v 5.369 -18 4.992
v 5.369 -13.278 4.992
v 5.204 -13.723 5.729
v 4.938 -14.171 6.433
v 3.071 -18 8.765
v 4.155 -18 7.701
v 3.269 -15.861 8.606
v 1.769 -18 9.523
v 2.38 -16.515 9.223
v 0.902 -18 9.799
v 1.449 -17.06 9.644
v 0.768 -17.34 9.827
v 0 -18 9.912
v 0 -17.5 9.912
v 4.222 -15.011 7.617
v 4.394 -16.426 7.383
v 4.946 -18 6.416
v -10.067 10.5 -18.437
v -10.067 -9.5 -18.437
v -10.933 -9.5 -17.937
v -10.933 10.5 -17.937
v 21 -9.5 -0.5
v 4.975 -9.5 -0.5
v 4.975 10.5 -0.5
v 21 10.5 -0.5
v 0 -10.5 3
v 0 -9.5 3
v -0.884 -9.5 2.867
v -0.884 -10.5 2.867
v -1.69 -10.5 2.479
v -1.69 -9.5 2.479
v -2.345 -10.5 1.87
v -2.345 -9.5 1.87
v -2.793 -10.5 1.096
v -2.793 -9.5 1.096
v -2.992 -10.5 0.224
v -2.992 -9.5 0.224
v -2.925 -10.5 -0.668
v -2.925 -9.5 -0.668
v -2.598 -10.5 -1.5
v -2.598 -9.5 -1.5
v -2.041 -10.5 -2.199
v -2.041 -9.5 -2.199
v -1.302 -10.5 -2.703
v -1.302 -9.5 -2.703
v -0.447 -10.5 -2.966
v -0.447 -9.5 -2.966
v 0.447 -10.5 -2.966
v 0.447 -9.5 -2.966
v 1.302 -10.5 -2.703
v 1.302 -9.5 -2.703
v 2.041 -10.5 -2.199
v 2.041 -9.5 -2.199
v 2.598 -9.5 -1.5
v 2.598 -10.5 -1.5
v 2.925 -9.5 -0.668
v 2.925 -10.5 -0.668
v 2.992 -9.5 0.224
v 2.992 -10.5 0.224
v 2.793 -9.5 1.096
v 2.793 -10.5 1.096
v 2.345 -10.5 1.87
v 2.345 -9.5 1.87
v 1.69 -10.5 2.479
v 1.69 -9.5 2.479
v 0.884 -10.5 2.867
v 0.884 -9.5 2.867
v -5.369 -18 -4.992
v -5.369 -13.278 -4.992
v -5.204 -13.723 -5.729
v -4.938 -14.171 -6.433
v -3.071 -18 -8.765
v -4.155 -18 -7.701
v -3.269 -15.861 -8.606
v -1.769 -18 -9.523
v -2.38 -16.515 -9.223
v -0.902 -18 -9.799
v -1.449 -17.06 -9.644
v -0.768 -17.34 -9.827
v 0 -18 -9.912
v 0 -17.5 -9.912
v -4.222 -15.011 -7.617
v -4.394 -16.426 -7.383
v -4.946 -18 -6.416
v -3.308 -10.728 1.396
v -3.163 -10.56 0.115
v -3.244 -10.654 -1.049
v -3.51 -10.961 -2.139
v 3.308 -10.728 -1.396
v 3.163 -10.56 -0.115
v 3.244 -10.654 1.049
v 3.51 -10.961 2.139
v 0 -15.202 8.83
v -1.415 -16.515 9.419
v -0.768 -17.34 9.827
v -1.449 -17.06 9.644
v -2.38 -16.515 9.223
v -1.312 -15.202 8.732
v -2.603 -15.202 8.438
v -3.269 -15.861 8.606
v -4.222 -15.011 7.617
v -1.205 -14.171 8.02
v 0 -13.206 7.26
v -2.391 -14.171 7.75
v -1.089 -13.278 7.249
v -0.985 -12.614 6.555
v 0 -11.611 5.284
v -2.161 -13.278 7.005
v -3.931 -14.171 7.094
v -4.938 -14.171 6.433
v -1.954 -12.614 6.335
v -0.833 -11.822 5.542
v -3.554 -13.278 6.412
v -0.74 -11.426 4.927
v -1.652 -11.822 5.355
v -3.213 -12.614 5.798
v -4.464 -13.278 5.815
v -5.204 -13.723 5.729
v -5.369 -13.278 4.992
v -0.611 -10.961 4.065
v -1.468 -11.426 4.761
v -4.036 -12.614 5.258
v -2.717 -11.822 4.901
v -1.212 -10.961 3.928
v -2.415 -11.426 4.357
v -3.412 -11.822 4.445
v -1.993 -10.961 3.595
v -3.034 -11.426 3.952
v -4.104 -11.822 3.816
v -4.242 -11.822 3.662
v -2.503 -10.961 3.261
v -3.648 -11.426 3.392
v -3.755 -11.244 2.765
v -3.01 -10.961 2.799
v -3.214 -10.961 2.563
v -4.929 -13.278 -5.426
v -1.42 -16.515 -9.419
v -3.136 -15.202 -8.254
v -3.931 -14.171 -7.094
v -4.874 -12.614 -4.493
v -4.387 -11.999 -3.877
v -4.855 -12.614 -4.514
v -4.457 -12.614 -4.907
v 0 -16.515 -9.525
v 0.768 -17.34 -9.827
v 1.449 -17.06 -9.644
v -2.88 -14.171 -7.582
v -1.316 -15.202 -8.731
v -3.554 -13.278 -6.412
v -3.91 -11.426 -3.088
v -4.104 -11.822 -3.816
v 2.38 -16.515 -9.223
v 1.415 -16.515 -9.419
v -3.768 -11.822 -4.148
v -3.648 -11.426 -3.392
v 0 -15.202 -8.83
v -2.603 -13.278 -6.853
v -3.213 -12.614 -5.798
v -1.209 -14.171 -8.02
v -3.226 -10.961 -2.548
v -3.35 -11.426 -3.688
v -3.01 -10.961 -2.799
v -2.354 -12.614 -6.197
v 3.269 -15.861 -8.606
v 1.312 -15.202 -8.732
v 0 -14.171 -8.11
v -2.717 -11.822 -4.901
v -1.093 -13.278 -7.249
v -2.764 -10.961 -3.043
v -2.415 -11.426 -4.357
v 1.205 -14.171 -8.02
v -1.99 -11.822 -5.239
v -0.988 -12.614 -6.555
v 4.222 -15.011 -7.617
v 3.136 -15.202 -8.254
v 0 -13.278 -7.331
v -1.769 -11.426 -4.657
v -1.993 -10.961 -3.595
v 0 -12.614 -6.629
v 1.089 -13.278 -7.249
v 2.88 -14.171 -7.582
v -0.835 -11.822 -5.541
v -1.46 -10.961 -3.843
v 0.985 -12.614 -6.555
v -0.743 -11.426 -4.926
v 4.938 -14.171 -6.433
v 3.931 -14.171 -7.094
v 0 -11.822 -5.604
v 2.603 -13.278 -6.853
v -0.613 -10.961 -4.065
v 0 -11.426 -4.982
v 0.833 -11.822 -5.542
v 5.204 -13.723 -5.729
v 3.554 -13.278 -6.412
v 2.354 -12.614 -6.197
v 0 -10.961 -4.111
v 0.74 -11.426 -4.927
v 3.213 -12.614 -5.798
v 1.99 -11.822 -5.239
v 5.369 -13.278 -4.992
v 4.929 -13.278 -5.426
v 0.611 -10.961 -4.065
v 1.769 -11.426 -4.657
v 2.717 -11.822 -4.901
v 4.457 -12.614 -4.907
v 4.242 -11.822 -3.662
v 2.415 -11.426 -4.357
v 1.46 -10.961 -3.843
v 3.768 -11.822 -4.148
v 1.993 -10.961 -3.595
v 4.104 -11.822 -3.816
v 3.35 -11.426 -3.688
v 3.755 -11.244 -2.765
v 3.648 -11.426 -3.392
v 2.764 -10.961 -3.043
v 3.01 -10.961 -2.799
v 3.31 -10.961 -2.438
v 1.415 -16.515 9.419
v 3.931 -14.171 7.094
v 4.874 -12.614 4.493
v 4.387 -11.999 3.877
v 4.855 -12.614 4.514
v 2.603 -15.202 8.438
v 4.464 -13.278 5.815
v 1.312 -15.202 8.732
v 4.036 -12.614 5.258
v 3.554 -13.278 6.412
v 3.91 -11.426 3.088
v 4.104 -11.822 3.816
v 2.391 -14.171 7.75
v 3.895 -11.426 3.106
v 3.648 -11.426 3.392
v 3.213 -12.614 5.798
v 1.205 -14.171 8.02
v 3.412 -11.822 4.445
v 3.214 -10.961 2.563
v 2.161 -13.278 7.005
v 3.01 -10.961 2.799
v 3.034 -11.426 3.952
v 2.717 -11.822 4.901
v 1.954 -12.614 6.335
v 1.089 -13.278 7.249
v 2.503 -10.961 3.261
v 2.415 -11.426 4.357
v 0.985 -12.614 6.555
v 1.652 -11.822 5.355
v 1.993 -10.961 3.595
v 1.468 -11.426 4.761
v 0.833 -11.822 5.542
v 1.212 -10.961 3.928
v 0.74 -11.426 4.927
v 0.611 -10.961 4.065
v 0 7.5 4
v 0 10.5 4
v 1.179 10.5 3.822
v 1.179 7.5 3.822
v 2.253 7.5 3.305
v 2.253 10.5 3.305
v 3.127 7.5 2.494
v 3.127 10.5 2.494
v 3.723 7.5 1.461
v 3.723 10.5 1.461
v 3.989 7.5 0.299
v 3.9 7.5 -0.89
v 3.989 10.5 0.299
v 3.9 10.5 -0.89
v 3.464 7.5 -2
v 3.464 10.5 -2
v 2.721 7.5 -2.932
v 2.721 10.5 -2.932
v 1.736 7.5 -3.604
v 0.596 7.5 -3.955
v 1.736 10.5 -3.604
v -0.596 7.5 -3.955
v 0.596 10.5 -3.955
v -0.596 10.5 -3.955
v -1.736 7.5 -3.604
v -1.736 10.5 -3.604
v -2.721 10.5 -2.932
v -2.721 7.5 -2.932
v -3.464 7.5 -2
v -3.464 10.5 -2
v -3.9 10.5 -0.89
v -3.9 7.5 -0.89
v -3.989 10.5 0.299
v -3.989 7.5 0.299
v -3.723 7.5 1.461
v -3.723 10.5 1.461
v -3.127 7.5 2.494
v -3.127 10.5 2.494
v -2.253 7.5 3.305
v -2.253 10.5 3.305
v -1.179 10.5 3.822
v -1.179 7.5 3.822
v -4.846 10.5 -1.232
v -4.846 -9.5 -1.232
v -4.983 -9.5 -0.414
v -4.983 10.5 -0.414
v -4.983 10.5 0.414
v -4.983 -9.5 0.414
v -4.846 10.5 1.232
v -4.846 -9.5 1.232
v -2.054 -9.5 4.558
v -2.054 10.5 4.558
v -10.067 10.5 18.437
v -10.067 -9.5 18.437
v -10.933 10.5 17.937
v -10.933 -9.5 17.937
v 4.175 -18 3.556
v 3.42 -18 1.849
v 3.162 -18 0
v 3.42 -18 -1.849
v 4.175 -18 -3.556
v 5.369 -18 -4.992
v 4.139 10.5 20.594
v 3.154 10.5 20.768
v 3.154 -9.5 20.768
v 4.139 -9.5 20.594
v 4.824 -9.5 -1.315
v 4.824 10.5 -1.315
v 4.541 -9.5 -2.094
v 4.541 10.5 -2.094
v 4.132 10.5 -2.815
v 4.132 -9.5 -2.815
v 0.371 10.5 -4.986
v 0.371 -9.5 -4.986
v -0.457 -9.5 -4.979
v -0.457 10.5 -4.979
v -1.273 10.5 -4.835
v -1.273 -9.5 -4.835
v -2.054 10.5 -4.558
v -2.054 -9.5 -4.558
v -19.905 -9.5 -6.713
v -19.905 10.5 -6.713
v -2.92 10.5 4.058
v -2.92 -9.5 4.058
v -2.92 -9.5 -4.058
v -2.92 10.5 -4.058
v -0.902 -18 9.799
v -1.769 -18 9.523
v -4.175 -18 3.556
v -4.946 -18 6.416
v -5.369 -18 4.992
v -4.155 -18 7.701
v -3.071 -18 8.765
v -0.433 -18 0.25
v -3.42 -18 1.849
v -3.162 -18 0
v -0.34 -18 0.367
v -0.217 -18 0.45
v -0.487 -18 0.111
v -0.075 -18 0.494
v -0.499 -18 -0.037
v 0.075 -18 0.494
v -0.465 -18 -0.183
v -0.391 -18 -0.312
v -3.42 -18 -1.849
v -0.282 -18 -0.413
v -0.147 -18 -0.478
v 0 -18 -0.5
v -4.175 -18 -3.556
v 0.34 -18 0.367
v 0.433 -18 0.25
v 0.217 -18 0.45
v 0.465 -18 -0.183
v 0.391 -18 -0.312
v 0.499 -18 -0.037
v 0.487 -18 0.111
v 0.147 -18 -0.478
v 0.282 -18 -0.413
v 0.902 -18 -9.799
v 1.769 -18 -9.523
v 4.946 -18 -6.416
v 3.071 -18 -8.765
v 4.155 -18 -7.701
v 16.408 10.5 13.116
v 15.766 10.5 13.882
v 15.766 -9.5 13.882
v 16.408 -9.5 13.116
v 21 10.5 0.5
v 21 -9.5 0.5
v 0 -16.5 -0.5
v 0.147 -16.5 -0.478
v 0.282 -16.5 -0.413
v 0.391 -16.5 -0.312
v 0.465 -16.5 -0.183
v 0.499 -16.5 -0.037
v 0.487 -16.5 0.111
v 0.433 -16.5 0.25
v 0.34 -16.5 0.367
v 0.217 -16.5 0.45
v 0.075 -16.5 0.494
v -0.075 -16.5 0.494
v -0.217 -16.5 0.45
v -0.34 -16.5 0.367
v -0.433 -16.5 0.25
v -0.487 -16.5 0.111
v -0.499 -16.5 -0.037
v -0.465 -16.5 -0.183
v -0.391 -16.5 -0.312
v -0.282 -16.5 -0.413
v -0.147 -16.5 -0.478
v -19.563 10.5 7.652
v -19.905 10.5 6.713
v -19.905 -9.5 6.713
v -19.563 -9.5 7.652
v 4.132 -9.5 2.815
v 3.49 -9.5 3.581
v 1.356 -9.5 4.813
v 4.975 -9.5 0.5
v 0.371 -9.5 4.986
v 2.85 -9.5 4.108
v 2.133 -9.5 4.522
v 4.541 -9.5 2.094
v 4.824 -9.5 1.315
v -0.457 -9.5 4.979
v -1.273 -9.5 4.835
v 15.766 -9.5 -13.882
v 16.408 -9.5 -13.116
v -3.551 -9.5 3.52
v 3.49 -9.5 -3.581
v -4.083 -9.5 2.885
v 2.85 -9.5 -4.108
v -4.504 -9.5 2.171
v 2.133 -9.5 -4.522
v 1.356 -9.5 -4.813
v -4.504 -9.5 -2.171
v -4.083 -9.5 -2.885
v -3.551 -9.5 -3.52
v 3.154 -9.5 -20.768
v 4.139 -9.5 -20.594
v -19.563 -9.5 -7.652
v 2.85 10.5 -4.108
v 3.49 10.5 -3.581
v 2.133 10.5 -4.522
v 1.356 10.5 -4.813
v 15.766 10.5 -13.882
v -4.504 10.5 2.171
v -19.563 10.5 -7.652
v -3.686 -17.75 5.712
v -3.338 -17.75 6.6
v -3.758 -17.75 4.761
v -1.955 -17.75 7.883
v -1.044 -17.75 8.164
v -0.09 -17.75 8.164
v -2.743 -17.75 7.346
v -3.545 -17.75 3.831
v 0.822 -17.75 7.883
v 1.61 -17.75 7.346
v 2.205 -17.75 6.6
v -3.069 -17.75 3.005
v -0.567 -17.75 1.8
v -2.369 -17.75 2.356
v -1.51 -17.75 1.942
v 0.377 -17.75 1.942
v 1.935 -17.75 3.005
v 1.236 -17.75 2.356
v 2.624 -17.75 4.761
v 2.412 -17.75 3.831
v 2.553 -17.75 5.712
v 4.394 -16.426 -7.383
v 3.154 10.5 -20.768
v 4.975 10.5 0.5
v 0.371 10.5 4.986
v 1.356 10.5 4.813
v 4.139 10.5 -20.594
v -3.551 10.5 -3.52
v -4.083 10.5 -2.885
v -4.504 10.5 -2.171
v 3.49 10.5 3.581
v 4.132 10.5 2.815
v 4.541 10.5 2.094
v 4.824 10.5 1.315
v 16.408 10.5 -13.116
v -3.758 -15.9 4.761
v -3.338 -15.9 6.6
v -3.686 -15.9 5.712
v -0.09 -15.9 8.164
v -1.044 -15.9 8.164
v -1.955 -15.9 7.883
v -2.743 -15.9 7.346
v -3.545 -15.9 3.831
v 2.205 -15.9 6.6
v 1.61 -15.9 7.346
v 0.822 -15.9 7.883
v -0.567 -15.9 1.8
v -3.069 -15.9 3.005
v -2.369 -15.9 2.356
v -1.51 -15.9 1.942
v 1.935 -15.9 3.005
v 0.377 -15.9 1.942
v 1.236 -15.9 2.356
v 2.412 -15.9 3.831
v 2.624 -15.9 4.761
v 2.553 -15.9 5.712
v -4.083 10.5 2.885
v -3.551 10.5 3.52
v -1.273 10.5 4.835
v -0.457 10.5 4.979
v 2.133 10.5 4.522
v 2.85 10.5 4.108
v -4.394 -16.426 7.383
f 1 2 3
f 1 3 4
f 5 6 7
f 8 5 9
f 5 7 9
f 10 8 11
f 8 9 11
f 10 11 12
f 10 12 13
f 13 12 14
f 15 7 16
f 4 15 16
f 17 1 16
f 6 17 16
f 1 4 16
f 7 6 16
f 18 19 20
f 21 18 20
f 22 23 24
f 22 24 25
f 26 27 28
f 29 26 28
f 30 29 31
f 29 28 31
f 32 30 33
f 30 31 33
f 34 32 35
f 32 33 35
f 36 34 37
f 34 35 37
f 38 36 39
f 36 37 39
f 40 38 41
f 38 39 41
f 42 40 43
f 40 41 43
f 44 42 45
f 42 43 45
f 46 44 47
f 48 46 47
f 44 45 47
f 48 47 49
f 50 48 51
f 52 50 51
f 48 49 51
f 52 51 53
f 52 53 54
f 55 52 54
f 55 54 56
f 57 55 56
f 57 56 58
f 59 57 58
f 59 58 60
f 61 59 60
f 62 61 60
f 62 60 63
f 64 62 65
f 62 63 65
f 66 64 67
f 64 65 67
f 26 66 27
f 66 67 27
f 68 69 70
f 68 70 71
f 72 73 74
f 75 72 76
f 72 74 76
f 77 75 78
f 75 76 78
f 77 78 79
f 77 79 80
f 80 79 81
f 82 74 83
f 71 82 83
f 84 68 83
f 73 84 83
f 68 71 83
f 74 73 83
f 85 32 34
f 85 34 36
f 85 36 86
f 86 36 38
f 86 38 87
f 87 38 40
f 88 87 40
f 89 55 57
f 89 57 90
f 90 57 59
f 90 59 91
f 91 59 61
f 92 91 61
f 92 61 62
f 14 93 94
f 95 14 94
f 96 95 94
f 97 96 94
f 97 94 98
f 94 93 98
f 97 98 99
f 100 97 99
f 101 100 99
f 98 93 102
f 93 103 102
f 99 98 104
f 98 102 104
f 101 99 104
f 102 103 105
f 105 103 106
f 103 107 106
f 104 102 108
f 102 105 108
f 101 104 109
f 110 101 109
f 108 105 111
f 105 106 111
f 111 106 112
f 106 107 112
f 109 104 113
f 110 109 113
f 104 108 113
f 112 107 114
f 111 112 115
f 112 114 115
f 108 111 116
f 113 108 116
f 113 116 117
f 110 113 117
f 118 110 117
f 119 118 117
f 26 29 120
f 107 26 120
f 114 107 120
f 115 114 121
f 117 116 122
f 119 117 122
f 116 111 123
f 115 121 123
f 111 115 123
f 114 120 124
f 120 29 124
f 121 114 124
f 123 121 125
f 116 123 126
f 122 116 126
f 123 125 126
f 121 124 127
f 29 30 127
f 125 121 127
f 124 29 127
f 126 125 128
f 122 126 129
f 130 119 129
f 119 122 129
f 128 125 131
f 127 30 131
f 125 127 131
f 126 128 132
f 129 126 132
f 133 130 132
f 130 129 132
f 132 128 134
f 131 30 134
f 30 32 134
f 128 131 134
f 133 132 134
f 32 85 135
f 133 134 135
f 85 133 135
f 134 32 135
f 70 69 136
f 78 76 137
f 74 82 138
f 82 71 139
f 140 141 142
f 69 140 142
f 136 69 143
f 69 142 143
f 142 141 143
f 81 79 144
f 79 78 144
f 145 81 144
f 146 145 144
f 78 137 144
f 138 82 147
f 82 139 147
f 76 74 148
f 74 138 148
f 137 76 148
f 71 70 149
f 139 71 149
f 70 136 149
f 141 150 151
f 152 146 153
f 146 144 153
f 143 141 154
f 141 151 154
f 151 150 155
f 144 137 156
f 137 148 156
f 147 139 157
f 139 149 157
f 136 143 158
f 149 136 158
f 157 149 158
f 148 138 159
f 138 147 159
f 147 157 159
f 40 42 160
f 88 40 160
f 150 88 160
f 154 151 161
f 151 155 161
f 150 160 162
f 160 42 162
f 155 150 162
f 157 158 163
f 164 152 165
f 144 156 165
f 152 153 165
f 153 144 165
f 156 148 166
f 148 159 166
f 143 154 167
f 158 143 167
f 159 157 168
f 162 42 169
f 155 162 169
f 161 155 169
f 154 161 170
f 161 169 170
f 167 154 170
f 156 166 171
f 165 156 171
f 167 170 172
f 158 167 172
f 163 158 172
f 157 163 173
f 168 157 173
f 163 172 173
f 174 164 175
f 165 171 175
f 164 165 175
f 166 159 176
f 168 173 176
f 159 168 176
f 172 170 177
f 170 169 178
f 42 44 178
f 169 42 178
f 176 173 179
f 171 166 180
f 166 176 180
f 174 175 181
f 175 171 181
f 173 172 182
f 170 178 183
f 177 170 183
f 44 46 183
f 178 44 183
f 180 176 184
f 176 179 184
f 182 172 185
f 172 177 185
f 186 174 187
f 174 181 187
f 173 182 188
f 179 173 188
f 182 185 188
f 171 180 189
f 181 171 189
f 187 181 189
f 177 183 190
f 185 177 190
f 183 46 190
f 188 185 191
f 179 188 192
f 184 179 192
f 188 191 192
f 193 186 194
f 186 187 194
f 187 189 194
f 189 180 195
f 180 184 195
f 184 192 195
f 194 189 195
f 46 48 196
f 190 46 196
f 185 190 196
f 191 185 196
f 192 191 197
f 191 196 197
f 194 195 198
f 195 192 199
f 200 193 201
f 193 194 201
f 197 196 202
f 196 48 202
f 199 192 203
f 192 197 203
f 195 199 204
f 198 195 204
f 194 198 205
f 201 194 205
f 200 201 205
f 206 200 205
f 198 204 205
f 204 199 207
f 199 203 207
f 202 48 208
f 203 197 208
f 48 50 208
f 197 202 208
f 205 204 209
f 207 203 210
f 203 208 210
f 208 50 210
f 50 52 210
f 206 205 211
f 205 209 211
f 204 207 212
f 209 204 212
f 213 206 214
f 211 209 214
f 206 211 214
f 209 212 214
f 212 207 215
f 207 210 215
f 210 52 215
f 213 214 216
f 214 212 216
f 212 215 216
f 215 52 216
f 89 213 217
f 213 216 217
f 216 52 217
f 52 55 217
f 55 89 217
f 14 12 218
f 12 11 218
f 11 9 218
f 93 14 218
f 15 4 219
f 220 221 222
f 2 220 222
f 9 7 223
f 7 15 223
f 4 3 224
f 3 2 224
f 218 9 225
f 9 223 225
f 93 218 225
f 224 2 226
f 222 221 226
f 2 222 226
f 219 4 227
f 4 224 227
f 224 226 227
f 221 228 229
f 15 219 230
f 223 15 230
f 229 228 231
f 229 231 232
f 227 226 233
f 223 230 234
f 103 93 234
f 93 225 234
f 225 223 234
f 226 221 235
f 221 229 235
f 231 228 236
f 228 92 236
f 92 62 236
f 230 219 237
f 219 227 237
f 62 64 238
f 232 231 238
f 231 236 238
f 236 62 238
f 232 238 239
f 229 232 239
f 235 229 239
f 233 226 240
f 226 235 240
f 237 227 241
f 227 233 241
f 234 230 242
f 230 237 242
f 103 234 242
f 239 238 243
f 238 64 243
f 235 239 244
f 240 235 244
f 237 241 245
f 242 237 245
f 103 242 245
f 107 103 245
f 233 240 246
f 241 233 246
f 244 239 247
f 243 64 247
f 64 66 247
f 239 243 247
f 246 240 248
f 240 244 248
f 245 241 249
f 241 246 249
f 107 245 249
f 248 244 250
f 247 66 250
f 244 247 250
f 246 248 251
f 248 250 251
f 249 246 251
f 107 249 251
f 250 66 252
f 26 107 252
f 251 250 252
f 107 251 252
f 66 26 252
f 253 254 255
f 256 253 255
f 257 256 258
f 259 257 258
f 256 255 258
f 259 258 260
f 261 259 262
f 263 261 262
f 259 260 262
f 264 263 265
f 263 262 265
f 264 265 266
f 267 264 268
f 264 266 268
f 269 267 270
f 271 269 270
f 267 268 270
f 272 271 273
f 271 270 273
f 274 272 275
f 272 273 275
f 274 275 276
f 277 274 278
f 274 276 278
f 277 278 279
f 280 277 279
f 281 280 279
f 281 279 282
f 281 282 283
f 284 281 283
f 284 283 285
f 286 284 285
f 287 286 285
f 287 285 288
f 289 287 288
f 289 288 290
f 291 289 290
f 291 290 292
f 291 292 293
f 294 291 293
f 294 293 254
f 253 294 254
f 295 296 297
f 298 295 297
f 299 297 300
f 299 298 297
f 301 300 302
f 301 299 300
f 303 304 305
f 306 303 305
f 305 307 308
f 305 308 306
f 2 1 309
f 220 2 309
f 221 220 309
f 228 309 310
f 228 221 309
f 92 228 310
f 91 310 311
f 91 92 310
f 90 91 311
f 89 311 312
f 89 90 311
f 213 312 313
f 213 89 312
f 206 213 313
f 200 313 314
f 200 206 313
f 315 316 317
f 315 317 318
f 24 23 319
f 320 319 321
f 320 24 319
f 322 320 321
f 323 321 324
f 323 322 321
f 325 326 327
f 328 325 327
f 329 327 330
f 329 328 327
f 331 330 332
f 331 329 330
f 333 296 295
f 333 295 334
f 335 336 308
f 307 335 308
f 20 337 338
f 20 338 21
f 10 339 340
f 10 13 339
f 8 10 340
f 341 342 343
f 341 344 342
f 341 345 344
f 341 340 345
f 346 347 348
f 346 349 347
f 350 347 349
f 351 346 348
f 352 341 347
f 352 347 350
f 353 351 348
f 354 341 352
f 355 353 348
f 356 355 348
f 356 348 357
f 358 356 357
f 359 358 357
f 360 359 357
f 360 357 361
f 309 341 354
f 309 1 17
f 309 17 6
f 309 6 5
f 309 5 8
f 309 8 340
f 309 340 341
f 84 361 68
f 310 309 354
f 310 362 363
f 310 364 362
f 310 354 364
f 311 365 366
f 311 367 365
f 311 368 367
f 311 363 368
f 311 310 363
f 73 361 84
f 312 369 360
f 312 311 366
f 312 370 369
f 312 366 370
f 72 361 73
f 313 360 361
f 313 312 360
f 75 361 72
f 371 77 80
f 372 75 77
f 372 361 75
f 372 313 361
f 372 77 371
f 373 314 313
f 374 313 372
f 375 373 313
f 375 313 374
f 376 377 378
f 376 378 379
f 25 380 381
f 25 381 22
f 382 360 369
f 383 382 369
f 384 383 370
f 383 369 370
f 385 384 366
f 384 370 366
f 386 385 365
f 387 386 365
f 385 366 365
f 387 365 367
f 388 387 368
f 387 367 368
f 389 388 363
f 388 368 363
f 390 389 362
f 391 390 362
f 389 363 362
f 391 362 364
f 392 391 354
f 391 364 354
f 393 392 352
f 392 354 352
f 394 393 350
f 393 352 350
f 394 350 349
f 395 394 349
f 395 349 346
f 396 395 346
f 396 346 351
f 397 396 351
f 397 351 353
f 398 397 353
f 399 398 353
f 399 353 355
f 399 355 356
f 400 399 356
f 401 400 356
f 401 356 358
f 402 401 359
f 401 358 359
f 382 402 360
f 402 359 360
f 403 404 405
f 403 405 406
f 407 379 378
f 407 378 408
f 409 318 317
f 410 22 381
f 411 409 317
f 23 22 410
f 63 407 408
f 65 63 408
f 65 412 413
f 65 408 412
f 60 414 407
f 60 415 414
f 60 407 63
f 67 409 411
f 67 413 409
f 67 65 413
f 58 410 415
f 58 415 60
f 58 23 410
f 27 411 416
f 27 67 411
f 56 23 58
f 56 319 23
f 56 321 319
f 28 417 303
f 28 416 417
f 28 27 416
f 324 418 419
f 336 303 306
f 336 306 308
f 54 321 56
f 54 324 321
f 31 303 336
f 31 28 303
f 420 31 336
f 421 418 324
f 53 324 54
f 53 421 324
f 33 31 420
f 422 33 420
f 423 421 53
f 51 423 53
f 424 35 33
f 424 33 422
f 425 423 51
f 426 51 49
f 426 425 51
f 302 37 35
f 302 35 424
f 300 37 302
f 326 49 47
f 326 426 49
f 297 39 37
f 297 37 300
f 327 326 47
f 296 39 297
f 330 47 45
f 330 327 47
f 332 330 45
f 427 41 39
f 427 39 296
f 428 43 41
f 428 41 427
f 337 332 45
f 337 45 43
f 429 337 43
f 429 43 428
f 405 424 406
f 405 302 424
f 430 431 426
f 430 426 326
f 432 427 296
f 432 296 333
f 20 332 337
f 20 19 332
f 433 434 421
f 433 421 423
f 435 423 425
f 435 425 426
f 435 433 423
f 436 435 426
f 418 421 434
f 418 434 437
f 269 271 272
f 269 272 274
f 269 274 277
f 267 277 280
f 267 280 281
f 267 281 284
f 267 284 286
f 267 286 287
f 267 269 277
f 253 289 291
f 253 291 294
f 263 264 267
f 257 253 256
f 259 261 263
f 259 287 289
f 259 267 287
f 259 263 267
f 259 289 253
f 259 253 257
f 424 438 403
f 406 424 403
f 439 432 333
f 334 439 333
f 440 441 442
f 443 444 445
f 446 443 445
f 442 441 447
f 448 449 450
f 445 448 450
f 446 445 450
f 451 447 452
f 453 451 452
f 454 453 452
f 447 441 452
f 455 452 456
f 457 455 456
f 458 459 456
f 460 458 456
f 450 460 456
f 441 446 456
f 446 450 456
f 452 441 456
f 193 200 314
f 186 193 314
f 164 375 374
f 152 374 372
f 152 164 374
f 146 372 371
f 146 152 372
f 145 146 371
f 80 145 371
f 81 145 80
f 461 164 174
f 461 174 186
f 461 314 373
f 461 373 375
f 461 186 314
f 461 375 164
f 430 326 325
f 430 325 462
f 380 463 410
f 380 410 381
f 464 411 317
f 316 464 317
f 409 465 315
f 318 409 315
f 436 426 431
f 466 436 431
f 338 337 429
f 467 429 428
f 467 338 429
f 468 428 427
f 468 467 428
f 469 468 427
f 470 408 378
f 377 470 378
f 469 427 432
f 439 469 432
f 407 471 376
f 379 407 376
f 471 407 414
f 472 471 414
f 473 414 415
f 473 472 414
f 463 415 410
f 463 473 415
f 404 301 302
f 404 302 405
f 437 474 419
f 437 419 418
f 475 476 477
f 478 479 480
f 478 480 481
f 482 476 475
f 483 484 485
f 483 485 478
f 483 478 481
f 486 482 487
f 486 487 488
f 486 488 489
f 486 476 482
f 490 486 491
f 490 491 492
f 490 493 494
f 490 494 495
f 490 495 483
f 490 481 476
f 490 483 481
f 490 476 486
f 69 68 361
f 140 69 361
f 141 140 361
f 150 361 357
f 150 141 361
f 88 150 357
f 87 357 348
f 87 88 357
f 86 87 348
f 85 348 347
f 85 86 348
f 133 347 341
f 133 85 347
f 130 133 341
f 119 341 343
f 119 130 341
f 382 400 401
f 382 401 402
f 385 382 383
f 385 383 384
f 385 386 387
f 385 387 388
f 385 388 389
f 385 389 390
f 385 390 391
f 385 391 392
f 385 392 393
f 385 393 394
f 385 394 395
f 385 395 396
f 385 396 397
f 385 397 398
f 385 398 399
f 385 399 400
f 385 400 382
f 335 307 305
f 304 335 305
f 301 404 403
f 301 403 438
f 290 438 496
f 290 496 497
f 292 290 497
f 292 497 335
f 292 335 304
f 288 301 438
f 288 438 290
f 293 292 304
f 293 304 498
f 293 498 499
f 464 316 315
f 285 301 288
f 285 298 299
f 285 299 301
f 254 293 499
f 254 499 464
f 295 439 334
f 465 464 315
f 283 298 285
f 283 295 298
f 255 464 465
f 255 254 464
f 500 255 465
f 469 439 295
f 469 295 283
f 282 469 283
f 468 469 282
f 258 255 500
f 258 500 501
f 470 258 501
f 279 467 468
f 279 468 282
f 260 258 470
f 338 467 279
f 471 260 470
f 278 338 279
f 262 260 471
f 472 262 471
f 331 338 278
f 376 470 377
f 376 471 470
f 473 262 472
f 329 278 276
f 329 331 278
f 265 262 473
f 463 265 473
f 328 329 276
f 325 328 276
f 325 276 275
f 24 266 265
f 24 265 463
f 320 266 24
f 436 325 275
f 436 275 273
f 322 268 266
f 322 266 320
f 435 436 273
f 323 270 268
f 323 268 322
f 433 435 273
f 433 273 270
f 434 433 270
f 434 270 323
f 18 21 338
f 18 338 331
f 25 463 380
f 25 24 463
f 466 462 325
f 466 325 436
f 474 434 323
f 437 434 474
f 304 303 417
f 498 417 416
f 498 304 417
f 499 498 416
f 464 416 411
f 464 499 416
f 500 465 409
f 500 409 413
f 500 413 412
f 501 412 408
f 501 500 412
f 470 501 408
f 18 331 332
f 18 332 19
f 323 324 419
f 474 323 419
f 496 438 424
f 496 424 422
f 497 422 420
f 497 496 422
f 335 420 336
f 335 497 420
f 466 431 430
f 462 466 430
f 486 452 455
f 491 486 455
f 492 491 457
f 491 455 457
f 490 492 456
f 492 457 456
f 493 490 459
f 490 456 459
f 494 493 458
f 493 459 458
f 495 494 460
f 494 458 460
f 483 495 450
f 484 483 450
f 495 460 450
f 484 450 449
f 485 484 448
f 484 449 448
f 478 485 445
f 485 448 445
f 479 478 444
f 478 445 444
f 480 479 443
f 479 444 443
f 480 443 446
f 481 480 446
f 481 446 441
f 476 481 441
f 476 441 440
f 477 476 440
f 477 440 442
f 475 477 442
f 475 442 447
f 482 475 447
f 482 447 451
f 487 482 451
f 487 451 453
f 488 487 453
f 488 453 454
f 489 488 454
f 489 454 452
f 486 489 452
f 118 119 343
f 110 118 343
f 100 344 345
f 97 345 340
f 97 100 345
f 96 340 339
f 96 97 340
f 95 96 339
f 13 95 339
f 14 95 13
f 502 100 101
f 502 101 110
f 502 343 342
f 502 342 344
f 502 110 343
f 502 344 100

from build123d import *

# Parameters (mm, degrees)
SKETCH1_R           = 5
SKETCH1_R_2         = 3
BOSS_EXTRUDE2_DEPTH = 17.5
SKETCH4_W           = 18
SKETCH4_H           = 1
EXTRUDE_THIN1_DEPTH = 35
CIRPATTERN1_COUNT   = 9
SKETCH5_R           = 3
BOSS_EXTRUDE3_DEPTH = 15
SKETCH6_R           = 3.5
SKETCH6_R_2         = 1.5
CUT_EXTRUDE1_DEPTH  = 6
SKETCH15_R          = 1.5
CUT_EXTRUDE2_DEPTH  = 2
SKETCH17_R          = 2.5
BOSS_EXTRUDE4_DEPTH = 3
SKETCH18_R          = 2
CUT_EXTRUDE3_DEPTH  = 2
SKETCH19_R          = 4
CUT_EXTRUDE4_DEPTH  = 20
SKETCH20_W          = 45.677284088
SKETCH20_H          = 45.724664858
CUT_EXTRUDE5_DEPTH  = 8
SKETCH21_R          = 3
BOSS_EXTRUDE5_DEPTH = 1
SKETCH24_R          = 9.912143672
BOSS_EXTRUDE6_DEPTH = 0.5
SKETCH25_R          = 3.2
CUT_EXTRUDE6_DEPTH  = 2.1
SKETCH26_R          = 3.2
BOSS_EXTRUDE7_DEPTH = 0.25
CUT_EXTRUDE8_START  = -7.5
CUT_EXTRUDE8_DEPTH  = 7.5
SKETCH28_R          = 0.5
CUT_EXTRUDE9_DEPTH  = 1.5
CUT_EXTRUDE10_DEPTH = 7
BOSS_EXTRUDE8_START = 10
SKETCH30_R          = 4
BOSS_EXTRUDE8_DEPTH = 10


with BuildPart() as part:
    # Sketch1 → Boss-Extrude2 (new, symmetric)
    with BuildSketch(Plane(origin=(0, 0, 0), x_dir=(1, 0, 0), z_dir=(0, 1, 0))):
        with Locations(Location((0, 0, 0), (0, 0, 270))):
            Circle(SKETCH1_R)
        with Locations(Location((0, 0, 0), (0, 0, 270))):
            Circle(SKETCH1_R_2, mode=Mode.SUBTRACT)
    extrude(amount=BOSS_EXTRUDE2_DEPTH, both=True)

    # Sketch4 → Extrude-Thin1 (add)
    with BuildSketch(Plane(origin=(0, 17.5, 0), x_dir=(1, 0, 0), z_dir=(0, 1, 0))):
        with Locations((12, 0)):
            Rectangle(SKETCH4_W, SKETCH4_H)
    extrude_thin1 = extrude(amount=-EXTRUDE_THIN1_DEPTH)

    # CirPattern1: Extrude-Thin1 ×9 about axis
    cirpattern1_axis = Axis((0, 0, 0), (0, 1, 0))
    for i in range(1, CIRPATTERN1_COUNT):
        add(extrude_thin1.rotate(cirpattern1_axis, i * 360 / CIRPATTERN1_COUNT))

    # Sketch5 → Boss-Extrude3 (add)
    with BuildSketch(Plane(origin=(0, -17.5, 0), x_dir=(-1, 0, 0), z_dir=(0, -1, 0))):
        with Locations(Location((0, 0, 0), (0, 0, 90))):
            Circle(SKETCH5_R)
    extrude(amount=-BOSS_EXTRUDE3_DEPTH)

    # Sketch6 → Cut-Extrude1 (cut)
    with BuildSketch(Plane(origin=(0, -17.5, 0), x_dir=(-1, 0, 0), z_dir=(0, -1, 0))):
        with Locations(Location((0, 0, 0), (0, 0, 90))):
            Circle(SKETCH6_R)
        with Locations(Location((0, 0, 0), (0, 0, 90))):
            Circle(SKETCH6_R_2, mode=Mode.SUBTRACT)
    extrude(amount=-CUT_EXTRUDE1_DEPTH, mode=Mode.SUBTRACT)

    # Sketch15 → Cut-Extrude2 (cut)
    with BuildSketch(Plane.XZ.offset(17.5)):
        with Locations(Location((0, 0, 0), (0, 0, 270))):
            Circle(SKETCH15_R)
    extrude(amount=-CUT_EXTRUDE2_DEPTH, mode=Mode.SUBTRACT)

    # Sketch17 → Boss-Extrude4 (add)
    with BuildSketch(Plane.XZ.offset(17.5)):
        with Locations((18.5, 0)):
            Circle(SKETCH17_R)
    extrude(amount=-BOSS_EXTRUDE4_DEPTH)

    # Sketch18 → Cut-Extrude3 (cut)
    with BuildSketch(Plane.XZ.offset(17.5)):
        with Locations(Location((18.5, 0, 0), (0, 0, 270))):
            Circle(SKETCH18_R)
    extrude(amount=-CUT_EXTRUDE3_DEPTH, mode=Mode.SUBTRACT)

    # Sketch19 → Cut-Extrude4 (cut)
    with BuildSketch(Plane(origin=(0, 17.5, 0), x_dir=(1, 0, 0), z_dir=(0, 1, 0))):
        with Locations(Location((0, 0, 0), (0, 0, 270))):
            Circle(SKETCH19_R)
    extrude(amount=-CUT_EXTRUDE4_DEPTH, mode=Mode.SUBTRACT)

    # Sketch20 → Cut-Extrude5 (cut)
    with BuildSketch(Plane(origin=(0, -17.5, 0), x_dir=(-1, 0, 0), z_dir=(0, -1, 0))):
        Rectangle(SKETCH20_W, SKETCH20_H)
    extrude(amount=-CUT_EXTRUDE5_DEPTH, mode=Mode.SUBTRACT)

    # Sketch21 → Boss-Extrude5 (add)
    with BuildSketch(Plane.XZ.offset(9.5)):
        with Locations(Location((0, 0, 0), (0, 0, 90))):
            Circle(SKETCH21_R)
    extrude(amount=BOSS_EXTRUDE5_DEPTH)

    # Sketch23 → Revolve1 (revolve)
    with BuildSketch(Plane(origin=(0, 0, 0), x_dir=(0, 0, -1), z_dir=(1, 0, 0))):
        with BuildLine():
            Line((-3, -10.5), (-2, -10.5))
            Line((-2, -10.5), (0, -10.5))
            Line((0, -10.5), (0, -17.5))
            Line((0, -17.5), (-8.912143672, -17.5))
            Line((-8.912143672, -17.5), (-9.912143672, -17.5))
            ThreePointArc((-9.912143672, -17.5), (-7.260403323, -13.2057636), (-3, -10.5))
        make_face()
    revolve(axis=Axis((0, -11.130650603, 0), (0, -1, 0)))

    # Sketch24 → Boss-Extrude6 (add)
    with BuildSketch(Plane.XZ.offset(17.5)):
        with Locations(Location((0, 0, 0), (0, 0, 270))):
            Circle(SKETCH24_R)
    extrude(amount=BOSS_EXTRUDE6_DEPTH)

    # Sketch25 → Cut-Extrude6 (cut)
    with BuildSketch(Plane.XZ.offset(18)):
        with Locations(Location((-0.56668442, 5, 0), (0, 0, 270))):
            Circle(SKETCH25_R)
    extrude(amount=-CUT_EXTRUDE6_DEPTH, mode=Mode.SUBTRACT)

    # Sketch26 → Boss-Extrude7 (add)
    with BuildSketch(Plane.XZ.offset(18)):
        with Locations(Location((-0.56668442, 5, 0), (0, 0, 270))):
            Circle(SKETCH26_R)
    extrude(amount=-BOSS_EXTRUDE7_DEPTH)

    # Sketch27 → Cut-Extrude8 (cut)
    with BuildSketch(Plane.XZ.offset(18).offset(CUT_EXTRUDE8_START)):
        with BuildLine():
            ThreePointArc((-5.368630905, 4.991892601), (-6.424807204, 5.779358473), (-7.613826501, 6.346671425))
            ThreePointArc((-7.613826501, 6.346671425), (-9.912143672, 0), (-7.613826501, -6.346671425))
            ThreePointArc((-7.613826501, -6.346671425), (-6.424807204, -5.779358473), (-5.368630905, -4.991892601))
            ThreePointArc((-5.368630905, -4.991892601), (-3.162143672, 0), (-5.368630905, 4.991892601))
        make_face()
        with BuildLine():
            ThreePointArc((9.912143672, 0), (9.319869483, 3.375), (7.613826501, 6.346671425))
            ThreePointArc((7.613826501, 6.346671425), (6.424807204, 5.779358473), (5.368630905, 4.991892601))
            ThreePointArc((5.368630905, 4.991892601), (3.162143672, 0), (5.368630905, -4.991892601))
            ThreePointArc((5.368630905, -4.991892601), (6.424807204, -5.779358473), (7.613826501, -6.346671425))
            ThreePointArc((7.613826501, -6.346671425), (9.319869483, -3.375), (9.912143672, 0))
        make_face()
        with BuildLine():
            ThreePointArc((-5.368630905, -4.991892601), (-6.424807204, -5.779358473), (-7.613826501, -6.346671425))
            ThreePointArc((-7.613826501, -6.346671425), (-4.203657524, -8.976628297), (0, -9.912143672))
            add(Edge.make_bspline(
                [(-5.368630905, -4.991892601), (-4.998119196, -7.539682857), (-2.616364035, -9.837937814), (0, -9.912143672)],
                knots=[0, 0, 0, 0, 1, 1, 1, 1], degree=3))
        make_face()
        with BuildLine():
            add(Edge.make_bspline(
                [(5.368630905, -4.991892601), (4.998119196, -7.539682857), (2.616364035, -9.837937814), (0, -9.912143672)],
                knots=[0, 0, 0, 0, 1, 1, 1, 1], degree=3))
            ThreePointArc((0, -9.912143672), (4.203657524, -8.976628297), (7.613826501, -6.346671425))
            ThreePointArc((7.613826501, -6.346671425), (6.424807204, -5.779358473), (5.368630905, -4.991892601))
        make_face()
        with BuildLine():
            ThreePointArc((0, 9.912143672), (-4.203657524, 8.976628297), (-7.613826501, 6.346671425))
            ThreePointArc((-7.613826501, 6.346671425), (-6.424807204, 5.779358473), (-5.368630905, 4.991892601))
            add(Edge.make_bspline(
                [(-5.368630905, 4.991892601), (-4.998119196, 7.539682857), (-2.616364035, 9.837937814), (0, 9.912143672)],
                knots=[0, 0, 0, 0, 1, 1, 1, 1], degree=3))
        make_face()
        with BuildLine():
            ThreePointArc((7.613826501, 6.346671425), (4.203657524, 8.976628297), (0, 9.912143672))
            add(Edge.make_bspline(
                [(5.368630905, 4.991892601), (4.998119196, 7.539682857), (2.616364035, 9.837937814), (0, 9.912143672)],
                knots=[0, 0, 0, 0, 1, 1, 1, 1], degree=3))
            ThreePointArc((5.368630905, 4.991892601), (6.424807204, 5.779358473), (7.613826501, 6.346671425))
        make_face()
    extrude(amount=CUT_EXTRUDE8_DEPTH, mode=Mode.SUBTRACT)

    # Sketch28 → Cut-Extrude9 (cut)
    with BuildSketch(Plane.XZ.offset(18)):
        with Locations(Location((0, 0, 0), (0, 0, 270))):
            Circle(SKETCH28_R)
    extrude(amount=-CUT_EXTRUDE9_DEPTH, mode=Mode.SUBTRACT)

    # Sketch29 → Cut-Extrude10 (cut)
    with BuildSketch(Plane(origin=(0, 17.5, 0), x_dir=(1, 0, 0), z_dir=(0, 1, 0))):
        with BuildLine():
            Line((3.489629181, -3.580850203), (15.765539501, -13.881562025))
            Line((15.765539501, -13.881562025), (16.40832711, -13.115517582))
            Line((16.40832711, -13.115517582), (4.132416791, -2.81480576))
            ThreePointArc((4.132416791, -2.81480576), (4.698463104, -1.710100717), (4.974937186, -0.5))
            Line((4.974937186, -0.5), (21, -0.5))
            Line((21, -0.5), (21, 0.5))
            Line((21, 0.5), (4.974937186, 0.5))
            ThreePointArc((4.974937186, 0.5), (4.698463104, 1.710100717), (4.132416791, 2.81480576))
            Line((4.132416791, 2.81480576), (16.40832711, 13.115517582))
            Line((16.40832711, 13.115517582), (15.765539501, 13.881562025))
            Line((15.765539501, 13.881562025), (3.489629181, 3.580850203))
            ThreePointArc((3.489629181, 3.580850203), (2.5, 4.330127019), (1.356292653, 4.812532622))
            Line((1.356292653, 4.812532622), (4.139015608, 20.594138724))
            Line((4.139015608, 20.594138724), (3.154207854, 20.767786902))
            Line((3.154207854, 20.767786902), (0.3714849, 4.9861808))
            ThreePointArc((0.3714849, 4.9861808), (-0.868240888, 4.924038765), (-2.054455891, 4.558421985))
            Line((-2.054455891, 4.558421985), (-10.066987298, 18.436533479))
            Line((-10.066987298, 18.436533479), (-10.933012702, 17.936533479))
            Line((-10.933012702, 17.936533479), (-2.920481295, 4.058421985))
            ThreePointArc((-2.920481295, 4.058421985), (-3.830222216, 3.213938048), (-4.50390169, 2.17137504))
            Line((-4.50390169, 2.17137504), (-19.562534965, 7.65226932))
            Line((-19.562534965, 7.65226932), (-19.904555108, 6.712576699))
            Line((-19.904555108, 6.712576699), (-4.845921834, 1.231682419))
            ThreePointArc((-4.845921834, 1.231682419), (-5, 0), (-4.845921834, -1.231682419))
            Line((-4.845921834, -1.231682419), (-19.904555108, -6.712576699))
            Line((-19.904555108, -6.712576699), (-19.562534965, -7.65226932))
            Line((-19.562534965, -7.65226932), (-4.50390169, -2.17137504))
            ThreePointArc((-4.50390169, -2.17137504), (-3.830222216, -3.213938048), (-2.920481295, -4.058421985))
            Line((-2.920481295, -4.058421985), (-10.933012702, -17.936533479))
            Line((-10.933012702, -17.936533479), (-10.066987298, -18.436533479))
            Line((-10.066987298, -18.436533479), (-2.054455891, -4.558421985))
            ThreePointArc((-2.054455891, -4.558421985), (-0.868240888, -4.924038765), (0.3714849, -4.9861808))
            Line((0.3714849, -4.9861808), (3.154207854, -20.767786902))
            Line((3.154207854, -20.767786902), (4.139015608, -20.594138724))
            Line((4.139015608, -20.594138724), (1.356292653, -4.812532622))
            ThreePointArc((1.356292653, -4.812532622), (2.5, -4.330127019), (3.489629181, -3.580850203))
        make_face()
    extrude(amount=-CUT_EXTRUDE10_DEPTH, mode=Mode.SUBTRACT)

    # Sketch30 → Boss-Extrude8 (add)
    with BuildSketch(Plane(origin=(0, -2.5, 0), x_dir=(1, 0, 0), z_dir=(0, 1, 0)).offset(BOSS_EXTRUDE8_START)):
        with Locations(Location((0, 0, 0), (0, 0, 270))):
            Circle(SKETCH30_R)
    extrude(amount=-BOSS_EXTRUDE8_DEPTH)


solid = part.part
